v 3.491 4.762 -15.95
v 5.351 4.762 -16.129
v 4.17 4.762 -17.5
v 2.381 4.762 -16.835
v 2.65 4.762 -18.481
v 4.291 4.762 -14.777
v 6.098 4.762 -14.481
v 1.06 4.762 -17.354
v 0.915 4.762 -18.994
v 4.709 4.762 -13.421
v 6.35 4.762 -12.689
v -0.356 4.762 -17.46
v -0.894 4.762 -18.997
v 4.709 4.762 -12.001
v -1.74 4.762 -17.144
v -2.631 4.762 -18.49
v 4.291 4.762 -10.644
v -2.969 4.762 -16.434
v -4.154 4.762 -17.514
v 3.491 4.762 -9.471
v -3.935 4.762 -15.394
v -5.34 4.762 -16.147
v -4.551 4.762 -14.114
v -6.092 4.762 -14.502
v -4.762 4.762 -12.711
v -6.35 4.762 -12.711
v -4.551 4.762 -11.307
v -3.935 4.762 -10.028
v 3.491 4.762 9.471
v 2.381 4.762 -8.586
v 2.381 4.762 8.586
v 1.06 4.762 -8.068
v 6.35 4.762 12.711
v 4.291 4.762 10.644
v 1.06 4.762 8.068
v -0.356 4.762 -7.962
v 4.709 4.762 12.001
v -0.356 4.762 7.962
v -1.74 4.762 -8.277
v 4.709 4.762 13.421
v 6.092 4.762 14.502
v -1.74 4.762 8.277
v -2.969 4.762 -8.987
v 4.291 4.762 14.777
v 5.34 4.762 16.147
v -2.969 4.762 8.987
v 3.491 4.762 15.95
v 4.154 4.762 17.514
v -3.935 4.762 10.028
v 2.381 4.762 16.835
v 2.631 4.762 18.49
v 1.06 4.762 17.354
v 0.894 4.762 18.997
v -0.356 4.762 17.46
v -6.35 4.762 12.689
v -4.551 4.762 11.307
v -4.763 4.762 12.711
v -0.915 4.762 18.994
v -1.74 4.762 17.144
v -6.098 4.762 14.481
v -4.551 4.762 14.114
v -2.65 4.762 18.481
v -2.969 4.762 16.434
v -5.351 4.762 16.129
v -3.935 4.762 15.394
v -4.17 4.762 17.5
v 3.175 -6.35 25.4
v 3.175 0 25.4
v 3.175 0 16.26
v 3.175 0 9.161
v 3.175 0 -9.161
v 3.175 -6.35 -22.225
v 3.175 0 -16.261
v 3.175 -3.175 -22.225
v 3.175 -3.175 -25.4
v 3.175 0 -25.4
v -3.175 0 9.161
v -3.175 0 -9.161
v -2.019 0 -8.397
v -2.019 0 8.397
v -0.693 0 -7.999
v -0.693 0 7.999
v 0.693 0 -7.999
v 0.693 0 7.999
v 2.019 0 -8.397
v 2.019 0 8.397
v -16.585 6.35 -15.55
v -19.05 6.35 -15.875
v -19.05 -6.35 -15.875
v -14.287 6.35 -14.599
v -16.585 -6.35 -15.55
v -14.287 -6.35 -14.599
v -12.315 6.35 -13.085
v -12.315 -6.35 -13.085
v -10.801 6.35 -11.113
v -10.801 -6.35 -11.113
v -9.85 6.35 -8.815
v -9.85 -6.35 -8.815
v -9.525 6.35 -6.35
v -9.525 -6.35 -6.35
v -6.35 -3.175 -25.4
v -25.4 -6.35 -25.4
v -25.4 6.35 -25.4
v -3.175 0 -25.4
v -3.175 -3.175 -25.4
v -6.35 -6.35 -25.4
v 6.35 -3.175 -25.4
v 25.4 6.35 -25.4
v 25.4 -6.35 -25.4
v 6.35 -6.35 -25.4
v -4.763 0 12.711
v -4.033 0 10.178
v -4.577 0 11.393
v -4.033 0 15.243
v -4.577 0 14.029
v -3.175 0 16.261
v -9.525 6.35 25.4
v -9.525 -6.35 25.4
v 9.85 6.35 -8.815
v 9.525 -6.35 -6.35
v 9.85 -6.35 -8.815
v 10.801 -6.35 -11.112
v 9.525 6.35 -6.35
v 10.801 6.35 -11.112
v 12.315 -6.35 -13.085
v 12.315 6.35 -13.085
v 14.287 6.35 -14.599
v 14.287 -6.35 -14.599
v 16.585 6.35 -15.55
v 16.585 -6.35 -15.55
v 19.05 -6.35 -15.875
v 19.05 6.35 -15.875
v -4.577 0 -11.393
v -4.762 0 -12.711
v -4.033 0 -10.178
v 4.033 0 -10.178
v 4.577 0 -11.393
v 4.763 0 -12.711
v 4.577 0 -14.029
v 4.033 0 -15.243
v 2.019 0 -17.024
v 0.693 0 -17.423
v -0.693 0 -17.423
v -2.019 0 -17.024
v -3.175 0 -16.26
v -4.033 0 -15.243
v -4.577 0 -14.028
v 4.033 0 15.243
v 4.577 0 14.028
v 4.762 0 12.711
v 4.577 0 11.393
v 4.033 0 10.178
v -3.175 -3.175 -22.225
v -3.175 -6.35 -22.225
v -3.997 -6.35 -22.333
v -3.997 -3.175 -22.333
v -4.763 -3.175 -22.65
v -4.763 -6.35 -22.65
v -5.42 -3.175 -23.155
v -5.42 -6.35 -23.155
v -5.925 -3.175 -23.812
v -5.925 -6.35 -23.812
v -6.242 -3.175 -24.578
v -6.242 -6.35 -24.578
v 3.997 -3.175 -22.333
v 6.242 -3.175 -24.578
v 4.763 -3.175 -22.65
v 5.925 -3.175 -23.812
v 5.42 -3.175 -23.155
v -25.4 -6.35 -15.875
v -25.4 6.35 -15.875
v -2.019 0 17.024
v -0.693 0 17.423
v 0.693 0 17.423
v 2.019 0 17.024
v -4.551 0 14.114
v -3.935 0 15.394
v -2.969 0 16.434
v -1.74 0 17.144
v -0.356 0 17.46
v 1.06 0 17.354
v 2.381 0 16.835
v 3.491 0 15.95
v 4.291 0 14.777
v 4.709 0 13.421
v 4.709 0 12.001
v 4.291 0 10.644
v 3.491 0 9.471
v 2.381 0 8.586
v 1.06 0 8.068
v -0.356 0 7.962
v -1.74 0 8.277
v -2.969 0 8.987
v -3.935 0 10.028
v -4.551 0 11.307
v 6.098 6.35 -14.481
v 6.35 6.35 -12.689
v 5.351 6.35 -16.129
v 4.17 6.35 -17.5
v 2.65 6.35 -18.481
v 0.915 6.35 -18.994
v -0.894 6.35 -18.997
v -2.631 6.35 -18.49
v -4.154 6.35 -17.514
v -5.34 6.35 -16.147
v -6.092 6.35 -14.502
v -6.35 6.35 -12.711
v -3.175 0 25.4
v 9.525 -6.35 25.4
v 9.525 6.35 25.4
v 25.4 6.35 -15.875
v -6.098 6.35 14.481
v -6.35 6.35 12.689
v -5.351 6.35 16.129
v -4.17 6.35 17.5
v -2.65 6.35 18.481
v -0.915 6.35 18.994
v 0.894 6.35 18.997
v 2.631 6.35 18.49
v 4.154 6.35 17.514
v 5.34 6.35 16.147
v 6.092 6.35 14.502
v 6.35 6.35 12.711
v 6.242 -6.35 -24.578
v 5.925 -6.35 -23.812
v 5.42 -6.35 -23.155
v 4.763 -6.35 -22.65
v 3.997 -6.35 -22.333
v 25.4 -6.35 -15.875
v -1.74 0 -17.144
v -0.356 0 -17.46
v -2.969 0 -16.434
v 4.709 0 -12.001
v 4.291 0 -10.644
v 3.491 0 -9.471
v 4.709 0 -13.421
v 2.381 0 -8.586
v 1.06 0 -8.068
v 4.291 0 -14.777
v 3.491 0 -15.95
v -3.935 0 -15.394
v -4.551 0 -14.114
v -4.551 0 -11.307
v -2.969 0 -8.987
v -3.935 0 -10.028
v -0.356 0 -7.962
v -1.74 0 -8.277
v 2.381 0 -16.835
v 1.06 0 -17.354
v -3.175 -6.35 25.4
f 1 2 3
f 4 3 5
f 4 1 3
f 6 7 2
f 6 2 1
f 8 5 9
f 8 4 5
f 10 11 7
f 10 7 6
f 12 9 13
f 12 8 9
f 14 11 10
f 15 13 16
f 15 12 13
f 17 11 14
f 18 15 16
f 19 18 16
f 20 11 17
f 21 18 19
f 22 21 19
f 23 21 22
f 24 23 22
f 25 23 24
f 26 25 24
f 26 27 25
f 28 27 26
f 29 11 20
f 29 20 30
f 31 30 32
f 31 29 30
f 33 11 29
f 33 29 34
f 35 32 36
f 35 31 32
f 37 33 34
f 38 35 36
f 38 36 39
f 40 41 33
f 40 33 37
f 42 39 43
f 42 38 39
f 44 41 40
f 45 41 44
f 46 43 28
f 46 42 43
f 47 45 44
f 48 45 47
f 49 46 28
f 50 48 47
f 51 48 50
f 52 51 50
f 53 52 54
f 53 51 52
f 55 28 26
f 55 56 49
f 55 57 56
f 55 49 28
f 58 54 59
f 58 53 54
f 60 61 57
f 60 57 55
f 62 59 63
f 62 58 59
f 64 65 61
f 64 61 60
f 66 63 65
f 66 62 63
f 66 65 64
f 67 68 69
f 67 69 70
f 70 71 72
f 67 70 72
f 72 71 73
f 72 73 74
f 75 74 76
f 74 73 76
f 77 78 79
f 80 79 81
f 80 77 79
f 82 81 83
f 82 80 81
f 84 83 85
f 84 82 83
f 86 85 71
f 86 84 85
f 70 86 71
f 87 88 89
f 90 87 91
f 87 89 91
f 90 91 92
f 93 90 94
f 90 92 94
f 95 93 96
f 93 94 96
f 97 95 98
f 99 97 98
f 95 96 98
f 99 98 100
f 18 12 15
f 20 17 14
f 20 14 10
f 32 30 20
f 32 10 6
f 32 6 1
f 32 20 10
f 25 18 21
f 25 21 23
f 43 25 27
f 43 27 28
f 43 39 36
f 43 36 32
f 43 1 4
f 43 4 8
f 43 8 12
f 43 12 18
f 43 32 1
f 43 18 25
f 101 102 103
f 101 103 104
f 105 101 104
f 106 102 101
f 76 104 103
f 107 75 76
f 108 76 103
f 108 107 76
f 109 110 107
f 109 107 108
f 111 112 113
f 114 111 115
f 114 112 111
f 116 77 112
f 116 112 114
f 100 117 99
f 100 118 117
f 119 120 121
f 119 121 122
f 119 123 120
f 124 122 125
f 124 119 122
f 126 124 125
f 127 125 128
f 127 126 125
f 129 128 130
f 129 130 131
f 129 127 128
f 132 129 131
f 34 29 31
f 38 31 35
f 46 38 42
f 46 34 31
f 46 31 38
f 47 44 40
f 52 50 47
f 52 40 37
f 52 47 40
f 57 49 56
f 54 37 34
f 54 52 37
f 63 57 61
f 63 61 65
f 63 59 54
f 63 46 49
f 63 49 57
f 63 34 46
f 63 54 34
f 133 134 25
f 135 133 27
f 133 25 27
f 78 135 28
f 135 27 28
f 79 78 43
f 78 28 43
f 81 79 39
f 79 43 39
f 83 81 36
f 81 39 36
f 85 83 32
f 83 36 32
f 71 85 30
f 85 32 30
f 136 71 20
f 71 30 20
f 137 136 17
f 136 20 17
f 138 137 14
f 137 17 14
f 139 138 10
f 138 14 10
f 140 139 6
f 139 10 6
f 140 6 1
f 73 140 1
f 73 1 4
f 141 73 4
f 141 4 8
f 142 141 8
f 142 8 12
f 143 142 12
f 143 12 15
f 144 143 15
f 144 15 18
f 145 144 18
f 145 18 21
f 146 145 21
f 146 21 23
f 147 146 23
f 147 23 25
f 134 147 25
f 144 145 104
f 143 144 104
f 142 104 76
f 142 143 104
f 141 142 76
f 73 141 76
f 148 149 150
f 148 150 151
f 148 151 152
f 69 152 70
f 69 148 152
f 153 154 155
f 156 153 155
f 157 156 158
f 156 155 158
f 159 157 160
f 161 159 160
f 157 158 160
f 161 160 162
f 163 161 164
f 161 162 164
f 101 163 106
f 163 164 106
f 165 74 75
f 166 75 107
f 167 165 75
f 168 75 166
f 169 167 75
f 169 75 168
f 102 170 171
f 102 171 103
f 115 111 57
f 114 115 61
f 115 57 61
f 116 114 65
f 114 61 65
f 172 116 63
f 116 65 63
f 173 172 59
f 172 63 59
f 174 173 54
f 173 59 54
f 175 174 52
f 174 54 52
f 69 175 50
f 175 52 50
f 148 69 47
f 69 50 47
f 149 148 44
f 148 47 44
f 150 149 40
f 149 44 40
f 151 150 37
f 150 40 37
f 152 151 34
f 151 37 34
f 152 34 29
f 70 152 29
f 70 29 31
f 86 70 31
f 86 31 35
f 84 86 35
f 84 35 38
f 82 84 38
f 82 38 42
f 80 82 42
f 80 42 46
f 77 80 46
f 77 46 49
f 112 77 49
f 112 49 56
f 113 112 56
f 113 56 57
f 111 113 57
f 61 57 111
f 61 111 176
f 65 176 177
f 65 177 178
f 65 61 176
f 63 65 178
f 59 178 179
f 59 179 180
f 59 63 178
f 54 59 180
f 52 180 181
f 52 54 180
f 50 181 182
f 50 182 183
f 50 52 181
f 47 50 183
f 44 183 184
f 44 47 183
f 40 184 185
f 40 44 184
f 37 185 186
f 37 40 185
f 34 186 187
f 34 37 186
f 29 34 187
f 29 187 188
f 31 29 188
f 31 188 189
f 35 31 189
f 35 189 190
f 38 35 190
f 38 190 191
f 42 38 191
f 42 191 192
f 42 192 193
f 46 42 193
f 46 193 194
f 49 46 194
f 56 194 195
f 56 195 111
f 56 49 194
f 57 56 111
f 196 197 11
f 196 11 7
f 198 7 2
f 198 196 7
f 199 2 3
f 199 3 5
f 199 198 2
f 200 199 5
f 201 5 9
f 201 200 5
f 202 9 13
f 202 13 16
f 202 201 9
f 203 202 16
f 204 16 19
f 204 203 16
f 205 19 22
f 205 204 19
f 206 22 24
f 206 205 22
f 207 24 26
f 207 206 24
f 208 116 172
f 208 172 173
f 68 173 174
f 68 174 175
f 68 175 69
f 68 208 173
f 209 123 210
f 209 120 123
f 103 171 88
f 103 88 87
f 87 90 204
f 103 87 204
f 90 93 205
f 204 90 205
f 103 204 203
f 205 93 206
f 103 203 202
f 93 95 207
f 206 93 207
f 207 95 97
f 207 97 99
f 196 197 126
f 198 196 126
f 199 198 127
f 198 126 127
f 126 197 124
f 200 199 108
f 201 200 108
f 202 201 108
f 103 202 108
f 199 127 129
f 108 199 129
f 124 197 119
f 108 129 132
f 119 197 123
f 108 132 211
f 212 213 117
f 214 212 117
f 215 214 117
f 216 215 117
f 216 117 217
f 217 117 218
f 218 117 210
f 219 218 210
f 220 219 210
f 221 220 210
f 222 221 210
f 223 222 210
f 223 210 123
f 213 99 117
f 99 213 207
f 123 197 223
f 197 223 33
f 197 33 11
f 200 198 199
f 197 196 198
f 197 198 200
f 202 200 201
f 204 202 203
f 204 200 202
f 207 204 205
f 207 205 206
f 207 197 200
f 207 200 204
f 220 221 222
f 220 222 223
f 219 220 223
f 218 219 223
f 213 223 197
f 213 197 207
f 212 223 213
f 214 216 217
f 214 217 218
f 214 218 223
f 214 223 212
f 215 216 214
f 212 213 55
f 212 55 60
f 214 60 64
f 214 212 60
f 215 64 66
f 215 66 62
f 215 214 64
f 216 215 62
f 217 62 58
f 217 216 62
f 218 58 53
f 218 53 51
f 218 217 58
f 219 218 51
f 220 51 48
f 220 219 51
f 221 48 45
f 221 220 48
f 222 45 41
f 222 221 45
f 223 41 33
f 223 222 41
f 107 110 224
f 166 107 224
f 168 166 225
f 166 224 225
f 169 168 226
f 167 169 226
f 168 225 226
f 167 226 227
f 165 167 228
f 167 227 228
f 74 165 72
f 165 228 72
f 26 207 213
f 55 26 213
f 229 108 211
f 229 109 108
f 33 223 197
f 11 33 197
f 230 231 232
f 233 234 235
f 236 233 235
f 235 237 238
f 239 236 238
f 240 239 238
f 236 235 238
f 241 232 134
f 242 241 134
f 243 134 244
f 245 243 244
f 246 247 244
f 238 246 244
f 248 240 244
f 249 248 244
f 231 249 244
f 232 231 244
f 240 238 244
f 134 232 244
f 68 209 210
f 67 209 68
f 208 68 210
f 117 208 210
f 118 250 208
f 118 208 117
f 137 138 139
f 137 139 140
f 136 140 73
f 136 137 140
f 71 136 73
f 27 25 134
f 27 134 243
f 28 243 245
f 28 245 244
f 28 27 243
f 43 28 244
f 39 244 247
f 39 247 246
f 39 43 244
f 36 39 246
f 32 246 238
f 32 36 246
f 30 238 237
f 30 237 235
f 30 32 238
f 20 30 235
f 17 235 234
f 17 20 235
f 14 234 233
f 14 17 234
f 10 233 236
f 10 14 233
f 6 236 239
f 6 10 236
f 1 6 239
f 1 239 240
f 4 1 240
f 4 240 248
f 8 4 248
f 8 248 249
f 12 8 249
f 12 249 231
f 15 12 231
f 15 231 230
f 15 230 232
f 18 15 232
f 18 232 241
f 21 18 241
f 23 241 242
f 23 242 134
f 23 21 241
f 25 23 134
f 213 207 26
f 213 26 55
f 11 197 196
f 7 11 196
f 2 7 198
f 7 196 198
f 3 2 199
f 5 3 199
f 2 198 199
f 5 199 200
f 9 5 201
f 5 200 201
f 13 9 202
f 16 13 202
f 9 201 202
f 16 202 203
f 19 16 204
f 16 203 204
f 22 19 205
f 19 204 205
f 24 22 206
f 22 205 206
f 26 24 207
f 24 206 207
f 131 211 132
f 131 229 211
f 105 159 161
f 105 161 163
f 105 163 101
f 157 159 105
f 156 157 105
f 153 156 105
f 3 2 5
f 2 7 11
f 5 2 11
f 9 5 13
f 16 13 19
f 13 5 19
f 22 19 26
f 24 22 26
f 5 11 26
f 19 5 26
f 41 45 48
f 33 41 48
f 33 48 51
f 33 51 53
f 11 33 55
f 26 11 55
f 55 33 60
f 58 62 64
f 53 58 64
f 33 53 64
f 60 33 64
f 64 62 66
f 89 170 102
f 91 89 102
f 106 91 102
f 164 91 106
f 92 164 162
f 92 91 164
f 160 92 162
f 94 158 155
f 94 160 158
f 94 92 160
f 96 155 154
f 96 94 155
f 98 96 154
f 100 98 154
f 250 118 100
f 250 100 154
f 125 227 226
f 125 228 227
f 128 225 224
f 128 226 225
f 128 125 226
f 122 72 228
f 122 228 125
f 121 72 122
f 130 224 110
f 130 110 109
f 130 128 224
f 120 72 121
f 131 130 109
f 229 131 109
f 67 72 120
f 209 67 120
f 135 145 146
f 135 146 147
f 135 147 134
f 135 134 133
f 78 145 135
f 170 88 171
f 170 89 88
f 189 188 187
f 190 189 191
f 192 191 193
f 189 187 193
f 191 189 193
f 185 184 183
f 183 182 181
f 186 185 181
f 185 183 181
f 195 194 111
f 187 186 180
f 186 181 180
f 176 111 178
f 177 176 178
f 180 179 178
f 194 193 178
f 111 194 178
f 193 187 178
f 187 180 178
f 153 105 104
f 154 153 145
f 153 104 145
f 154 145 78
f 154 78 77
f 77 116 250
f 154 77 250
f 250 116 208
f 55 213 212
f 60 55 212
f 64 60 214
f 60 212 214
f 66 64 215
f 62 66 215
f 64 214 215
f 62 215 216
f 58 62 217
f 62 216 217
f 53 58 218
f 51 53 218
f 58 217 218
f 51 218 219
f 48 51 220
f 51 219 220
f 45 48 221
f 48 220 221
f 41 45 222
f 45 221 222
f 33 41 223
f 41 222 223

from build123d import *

# Parameters (mm, degrees)
F1_DEPTH  = 6.35
F0_W      = 6.35
F0_H      = 50.8
F2_DEPTH  = 6.35
F4_R      = 9.525
F5_R      = 4.7625
F6_DEPTH  = 6.35
F7_DEPTH  = 1.5875
F9_DEPTH  = 3.175
F11_DEPTH = 3.175
F12_DEPTH = 1.5875
F13_R     = 4.7625
F14_DEPTH = 4.7625
F15_DEPTH = 4.7625


with BuildPart() as f1:
    # F0 (on Front) → F1 (new body)
    with BuildSketch(Plane.XZ):
        Polygon((-3.175, -25.4), (-3.175, 25.4), (-9.525, 25.4), (-9.525, -15.875), (-25.4, -15.875), (-25.4, -25.4), align=None)
    extrude(amount=F1_DEPTH)


with BuildPart() as f1b:
    # F0 (on Front) → F1, piece 2 (new body)
    with BuildSketch(Plane.XZ):
        Polygon((9.525, -15.875), (9.525, 25.4), (3.175, 25.4), (3.175, -25.4), (25.4, -25.4), (25.4, -15.875), align=None)
    extrude(amount=F1_DEPTH)


with BuildPart() as f2:
    # F0 (on Front) → F2 (new body)
    with BuildSketch(Plane.XZ):
        Polygon((9.525, -15.875), (9.525, 25.4), (3.175, 25.4), (3.175, -25.4), (25.4, -25.4), (25.4, -15.875), align=None)
        Rectangle(F0_W, F0_H)
        Polygon((-3.175, -25.4), (-3.175, 25.4), (-9.525, 25.4), (-9.525, -15.875), (-25.4, -15.875), (-25.4, -25.4), align=None)
    extrude(amount=-F2_DEPTH)


with BuildPart() as f1b_1:
    add(f1b.part)

    # F3: union F1, F2
    add(f1.part)
    add(f2.part)

    # F4
    f4_edges = [f1b_1.edges().sort_by_distance(p)[0] for p in [
        (9.525, 0, -15.875),
        (-9.525, 0, -15.875),
    ]]
    fillet(f4_edges, radius=F4_R)

    # F5 (on face) → F6 (cut)
    with BuildSketch(Plane(origin=(0, 6.35, 0), x_dir=(-1, 0, 0), z_dir=(0, 1, 0))):
        with Locations((1.8122e-05, 12.7107272731)):
            Circle(F5_R)
        with Locations((-1.8122e-05, -12.7107272731)):
            Circle(F5_R)
    extrude(amount=-F6_DEPTH, mode=Mode.SUBTRACT)

    # F5 (on face) → F7 (cut)
    with BuildSketch(Plane(origin=(0, 6.35, 0), x_dir=(-1, 0, 0), z_dir=(0, 1, 0))):
        with BuildLine():
            Line((6.35, -12.7107272731), (6.35, 12.6892727269))
            ThreePointArc((6.35, 12.6892727269), (0.0107454103, 19.060736334), (-6.35, 12.7107272731))
            Line((-6.35, 12.7107272731), (-6.35, -12.6892727269))
            ThreePointArc((-6.35, -12.6892727269), (-0.0107454103, -19.060736334), (6.35, -12.7107272731))
        make_face()
        with Locations((-1.8122e-05, -12.7107272731)):
            Circle(F5_R, mode=Mode.SUBTRACT)
        with Locations((1.8122e-05, 12.7107272731)):
            Circle(F5_R, mode=Mode.SUBTRACT)
    extrude(amount=-F7_DEPTH, mode=Mode.SUBTRACT)

    # F8 (on face) → F9 (cut)
    with BuildSketch(Plane.XZ.offset(6.35)):
        with BuildLine():
            Line((-3.175, -25.4), (-3.175, -22.225))
            ThreePointArc((-3.175, -22.225), (-5.4200640303, -23.1549359697), (-6.35, -25.4))
            Line((-6.35, -25.4), (-3.175, -25.4))
        make_face()
    extrude(amount=-F9_DEPTH, mode=Mode.SUBTRACT)

    # F10 (on face) → F11 (cut)
    with BuildSketch(Plane.XZ.offset(6.35)):
        with BuildLine():
            Line((3.175, -25.4), (6.35, -25.4))
            ThreePointArc((6.35, -25.4), (5.4200640303, -23.1549359697), (3.175, -22.225))
            Line((3.175, -22.225), (3.175, -25.4))
        make_face()
    extrude(amount=-F11_DEPTH, mode=Mode.SUBTRACT)


with BuildPart() as f12:
    # F5 (on face) → F12 (new body)
    with BuildSketch(Plane(origin=(0, 6.35, 0), x_dir=(-1, 0, 0), z_dir=(0, 1, 0))):
        with BuildLine():
            Line((6.35, -12.7107272731), (6.35, 12.6892727269))
            ThreePointArc((6.35, 12.6892727269), (0.0107454103, 19.060736334), (-6.35, 12.7107272731))
            Line((-6.35, 12.7107272731), (-6.35, -12.6892727269))
            ThreePointArc((-6.35, -12.6892727269), (-0.0107454103, -19.060736334), (6.35, -12.7107272731))
        make_face()
        with Locations((-1.8122e-05, -12.7107272731)):
            Circle(F5_R, mode=Mode.SUBTRACT)
        with Locations((1.8122e-05, 12.7107272731)):
            Circle(F5_R, mode=Mode.SUBTRACT)
        with Locations((1.8122e-05, 12.7107272731)):
            Circle(F5_R)
        with Locations((-1.8122e-05, -12.7107272731)):
            Circle(F5_R)
    extrude(amount=-F12_DEPTH)


with BuildPart() as f14:
    # F13 (on face) → F14 (new body)
    with BuildSketch(Plane(origin=(0, 4.7625, 0), x_dir=(-1, 0, 0), z_dir=(0, 1, 0))):
        with Locations((1.8122e-05, 12.7107272731)):
            Circle(F13_R)
    extrude(amount=-F14_DEPTH)


with BuildPart() as f15:
    # F13 (on face) → F15 (new body)
    with BuildSketch(Plane(origin=(0, 4.7625, 0), x_dir=(-1, 0, 0), z_dir=(0, 1, 0))):
        with Locations((-1.8122e-05, -12.7107272731)):
            Circle(F13_R)
    extrude(amount=-F15_DEPTH)


solid = Compound([f1b_1.part, f12.part, f14.part, f15.part])
